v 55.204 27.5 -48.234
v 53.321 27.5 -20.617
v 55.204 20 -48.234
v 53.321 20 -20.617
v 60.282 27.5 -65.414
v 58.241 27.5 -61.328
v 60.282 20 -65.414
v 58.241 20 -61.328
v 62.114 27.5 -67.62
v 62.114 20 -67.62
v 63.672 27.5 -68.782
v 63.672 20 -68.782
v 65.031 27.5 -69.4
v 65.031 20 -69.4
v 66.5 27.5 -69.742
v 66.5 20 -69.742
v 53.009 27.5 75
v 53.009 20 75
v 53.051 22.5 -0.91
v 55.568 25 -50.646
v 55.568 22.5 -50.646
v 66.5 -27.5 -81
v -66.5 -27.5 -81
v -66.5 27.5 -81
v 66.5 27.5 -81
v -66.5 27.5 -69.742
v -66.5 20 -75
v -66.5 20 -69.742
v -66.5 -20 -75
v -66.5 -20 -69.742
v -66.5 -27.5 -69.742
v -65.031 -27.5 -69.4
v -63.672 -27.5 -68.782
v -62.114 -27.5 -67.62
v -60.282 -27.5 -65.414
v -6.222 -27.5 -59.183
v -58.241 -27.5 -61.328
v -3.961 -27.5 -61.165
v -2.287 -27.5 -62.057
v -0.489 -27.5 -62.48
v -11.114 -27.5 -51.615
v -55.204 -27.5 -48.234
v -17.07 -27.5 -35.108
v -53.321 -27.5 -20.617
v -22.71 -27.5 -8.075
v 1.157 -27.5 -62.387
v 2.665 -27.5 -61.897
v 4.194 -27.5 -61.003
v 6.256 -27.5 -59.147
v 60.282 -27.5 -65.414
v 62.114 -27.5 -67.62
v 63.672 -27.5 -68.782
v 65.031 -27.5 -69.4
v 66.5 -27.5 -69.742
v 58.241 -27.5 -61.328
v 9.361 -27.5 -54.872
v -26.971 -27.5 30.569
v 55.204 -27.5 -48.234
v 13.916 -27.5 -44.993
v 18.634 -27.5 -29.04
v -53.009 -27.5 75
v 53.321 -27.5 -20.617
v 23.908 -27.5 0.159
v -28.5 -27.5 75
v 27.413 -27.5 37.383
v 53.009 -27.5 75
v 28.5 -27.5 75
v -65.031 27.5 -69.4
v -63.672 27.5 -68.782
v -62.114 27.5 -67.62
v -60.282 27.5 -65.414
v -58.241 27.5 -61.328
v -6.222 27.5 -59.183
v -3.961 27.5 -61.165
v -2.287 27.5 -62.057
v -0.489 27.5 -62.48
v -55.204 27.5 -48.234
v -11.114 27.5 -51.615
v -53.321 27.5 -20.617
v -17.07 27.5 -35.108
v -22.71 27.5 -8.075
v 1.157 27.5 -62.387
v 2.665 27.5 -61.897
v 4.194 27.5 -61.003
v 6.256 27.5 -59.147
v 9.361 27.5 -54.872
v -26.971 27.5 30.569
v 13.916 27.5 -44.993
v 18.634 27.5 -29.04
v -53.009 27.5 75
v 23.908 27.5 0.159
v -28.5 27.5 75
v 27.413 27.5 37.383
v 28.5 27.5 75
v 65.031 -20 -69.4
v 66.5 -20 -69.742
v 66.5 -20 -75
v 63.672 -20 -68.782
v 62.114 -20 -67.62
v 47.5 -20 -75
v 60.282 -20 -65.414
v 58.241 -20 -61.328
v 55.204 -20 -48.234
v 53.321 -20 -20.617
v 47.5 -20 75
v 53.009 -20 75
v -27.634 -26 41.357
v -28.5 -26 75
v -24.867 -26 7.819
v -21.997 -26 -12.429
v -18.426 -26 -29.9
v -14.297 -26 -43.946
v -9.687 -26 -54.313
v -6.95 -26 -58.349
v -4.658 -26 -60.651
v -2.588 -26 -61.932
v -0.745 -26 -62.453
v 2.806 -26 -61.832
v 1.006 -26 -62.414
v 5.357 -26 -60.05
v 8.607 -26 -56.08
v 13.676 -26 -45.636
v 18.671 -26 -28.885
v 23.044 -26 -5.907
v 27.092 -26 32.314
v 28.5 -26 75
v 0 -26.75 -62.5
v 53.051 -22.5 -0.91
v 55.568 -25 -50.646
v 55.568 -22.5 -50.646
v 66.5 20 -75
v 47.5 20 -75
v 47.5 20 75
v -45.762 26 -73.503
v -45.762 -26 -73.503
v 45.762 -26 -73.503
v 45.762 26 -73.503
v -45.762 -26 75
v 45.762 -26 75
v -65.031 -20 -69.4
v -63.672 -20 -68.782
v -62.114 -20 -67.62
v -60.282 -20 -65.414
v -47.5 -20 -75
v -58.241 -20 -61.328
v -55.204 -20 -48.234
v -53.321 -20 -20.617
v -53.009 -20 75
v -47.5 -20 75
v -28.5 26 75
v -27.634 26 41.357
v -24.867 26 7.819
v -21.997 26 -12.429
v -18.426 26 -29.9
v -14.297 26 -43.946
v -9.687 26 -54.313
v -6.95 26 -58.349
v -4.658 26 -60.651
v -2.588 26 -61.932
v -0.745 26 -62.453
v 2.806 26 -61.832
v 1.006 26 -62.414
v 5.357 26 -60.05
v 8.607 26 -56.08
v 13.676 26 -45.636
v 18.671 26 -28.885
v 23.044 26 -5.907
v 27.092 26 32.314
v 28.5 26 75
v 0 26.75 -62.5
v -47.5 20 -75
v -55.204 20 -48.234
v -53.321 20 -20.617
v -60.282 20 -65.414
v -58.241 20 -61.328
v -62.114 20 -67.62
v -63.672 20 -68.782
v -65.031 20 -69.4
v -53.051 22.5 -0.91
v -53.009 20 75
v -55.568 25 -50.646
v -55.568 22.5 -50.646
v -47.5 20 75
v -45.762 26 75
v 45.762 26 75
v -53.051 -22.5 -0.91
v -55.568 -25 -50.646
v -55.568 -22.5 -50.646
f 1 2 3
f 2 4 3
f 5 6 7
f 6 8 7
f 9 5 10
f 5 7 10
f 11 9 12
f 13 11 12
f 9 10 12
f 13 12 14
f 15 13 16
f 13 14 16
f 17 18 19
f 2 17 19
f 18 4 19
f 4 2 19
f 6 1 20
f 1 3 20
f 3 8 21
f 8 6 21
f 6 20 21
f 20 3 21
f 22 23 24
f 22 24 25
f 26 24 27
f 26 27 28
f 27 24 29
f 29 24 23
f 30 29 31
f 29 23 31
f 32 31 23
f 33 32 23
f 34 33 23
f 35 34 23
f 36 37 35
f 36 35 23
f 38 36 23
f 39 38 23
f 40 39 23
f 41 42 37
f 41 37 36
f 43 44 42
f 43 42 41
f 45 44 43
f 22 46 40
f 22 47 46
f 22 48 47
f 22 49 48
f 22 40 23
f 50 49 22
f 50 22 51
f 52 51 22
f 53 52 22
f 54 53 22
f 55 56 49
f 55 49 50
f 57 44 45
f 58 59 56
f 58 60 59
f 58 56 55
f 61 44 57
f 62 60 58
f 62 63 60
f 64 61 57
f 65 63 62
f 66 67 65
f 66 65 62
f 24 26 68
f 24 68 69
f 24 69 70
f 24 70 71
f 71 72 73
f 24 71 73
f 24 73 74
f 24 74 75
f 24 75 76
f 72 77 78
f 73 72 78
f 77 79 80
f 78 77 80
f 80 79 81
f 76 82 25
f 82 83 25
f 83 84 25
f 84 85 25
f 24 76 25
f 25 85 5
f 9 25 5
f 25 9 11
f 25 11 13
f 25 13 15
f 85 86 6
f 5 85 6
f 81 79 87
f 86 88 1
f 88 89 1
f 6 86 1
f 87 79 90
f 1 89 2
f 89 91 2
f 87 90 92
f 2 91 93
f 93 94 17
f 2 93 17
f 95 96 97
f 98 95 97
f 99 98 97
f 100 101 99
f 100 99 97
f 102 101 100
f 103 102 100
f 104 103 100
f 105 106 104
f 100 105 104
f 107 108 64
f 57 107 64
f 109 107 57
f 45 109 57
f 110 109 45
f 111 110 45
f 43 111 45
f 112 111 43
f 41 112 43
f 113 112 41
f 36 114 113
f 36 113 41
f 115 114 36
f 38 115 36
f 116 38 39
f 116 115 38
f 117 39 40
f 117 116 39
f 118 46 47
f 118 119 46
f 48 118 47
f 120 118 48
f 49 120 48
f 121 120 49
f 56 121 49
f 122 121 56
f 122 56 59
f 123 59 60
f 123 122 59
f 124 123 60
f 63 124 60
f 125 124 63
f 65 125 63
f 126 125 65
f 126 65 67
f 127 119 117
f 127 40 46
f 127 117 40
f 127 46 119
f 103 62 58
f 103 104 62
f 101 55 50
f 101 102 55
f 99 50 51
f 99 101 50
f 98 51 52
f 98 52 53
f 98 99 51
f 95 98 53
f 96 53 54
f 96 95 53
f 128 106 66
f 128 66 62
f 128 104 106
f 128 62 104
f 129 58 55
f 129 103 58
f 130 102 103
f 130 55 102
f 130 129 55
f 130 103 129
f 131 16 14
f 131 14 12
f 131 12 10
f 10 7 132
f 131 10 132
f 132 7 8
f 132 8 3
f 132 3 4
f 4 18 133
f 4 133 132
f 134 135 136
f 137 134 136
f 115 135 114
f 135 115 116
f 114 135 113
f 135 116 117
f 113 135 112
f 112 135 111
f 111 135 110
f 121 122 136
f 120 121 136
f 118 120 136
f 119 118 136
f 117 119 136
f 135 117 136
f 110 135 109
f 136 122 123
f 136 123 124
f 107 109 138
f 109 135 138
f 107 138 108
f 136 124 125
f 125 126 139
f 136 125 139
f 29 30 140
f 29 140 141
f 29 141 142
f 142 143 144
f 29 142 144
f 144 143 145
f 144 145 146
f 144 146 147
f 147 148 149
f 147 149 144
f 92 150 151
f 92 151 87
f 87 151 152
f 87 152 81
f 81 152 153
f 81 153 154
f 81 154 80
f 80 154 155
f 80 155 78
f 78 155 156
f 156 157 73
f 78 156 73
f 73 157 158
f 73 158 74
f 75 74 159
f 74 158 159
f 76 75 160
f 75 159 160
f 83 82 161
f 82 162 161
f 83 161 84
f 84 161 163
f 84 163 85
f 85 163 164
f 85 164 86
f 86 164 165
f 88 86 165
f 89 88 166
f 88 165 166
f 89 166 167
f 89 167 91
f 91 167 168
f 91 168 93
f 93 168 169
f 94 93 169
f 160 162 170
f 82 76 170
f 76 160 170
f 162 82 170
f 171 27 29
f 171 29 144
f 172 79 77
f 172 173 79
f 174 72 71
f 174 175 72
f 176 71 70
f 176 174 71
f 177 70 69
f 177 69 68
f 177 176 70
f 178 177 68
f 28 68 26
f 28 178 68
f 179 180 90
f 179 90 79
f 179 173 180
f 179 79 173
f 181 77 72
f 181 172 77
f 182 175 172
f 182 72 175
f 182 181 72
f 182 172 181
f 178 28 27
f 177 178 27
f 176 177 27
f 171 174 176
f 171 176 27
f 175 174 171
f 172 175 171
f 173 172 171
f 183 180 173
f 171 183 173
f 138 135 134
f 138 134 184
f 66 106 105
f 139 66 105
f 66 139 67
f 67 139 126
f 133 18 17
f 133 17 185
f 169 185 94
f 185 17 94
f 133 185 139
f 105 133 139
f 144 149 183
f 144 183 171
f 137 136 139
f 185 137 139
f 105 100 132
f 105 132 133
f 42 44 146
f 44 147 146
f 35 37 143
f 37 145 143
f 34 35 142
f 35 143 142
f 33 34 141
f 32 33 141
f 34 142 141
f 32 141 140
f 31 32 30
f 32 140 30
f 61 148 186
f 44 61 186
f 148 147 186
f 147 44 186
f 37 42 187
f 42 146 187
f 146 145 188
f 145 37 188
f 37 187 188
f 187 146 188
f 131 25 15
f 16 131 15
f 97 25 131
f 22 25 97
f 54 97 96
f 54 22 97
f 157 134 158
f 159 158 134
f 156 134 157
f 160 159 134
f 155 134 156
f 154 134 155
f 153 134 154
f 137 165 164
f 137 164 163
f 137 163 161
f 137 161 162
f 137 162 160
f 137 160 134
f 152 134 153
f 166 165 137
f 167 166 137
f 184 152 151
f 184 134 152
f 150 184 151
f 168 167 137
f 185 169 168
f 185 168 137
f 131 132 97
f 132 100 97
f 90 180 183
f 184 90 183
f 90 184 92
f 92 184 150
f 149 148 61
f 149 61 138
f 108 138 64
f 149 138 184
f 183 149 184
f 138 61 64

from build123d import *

# Parameters (mm, degrees)
F1_DEPTH = 27.5
F2_W     = 92
F2_H     = 160
F3_DEPTH = 26
F5_START = 20
F5_DEPTH = 7.5
F8_W     = 133
F8_H     = 6
F9_DEPTH = 27.5


# Not quite as in the source:
# - a feature names something its author has since deleted; it is built from what else it names


with BuildPart() as f1:
    # F0 (on Front) → F1 (new body, symmetric)
    with BuildSketch(Plane.XZ):
        with BuildLine():
            Line((-47.5, -75), (47.5, -75))
            Line((47.5, -75), (47.5, 75))
            Line((47.5, 75), (28.5, 75))
            add(Edge.make_bspline(
                [(0, -62.5), (28.5, -62.5), (28.5, 75)],
                knots=[0, 0, 0, 1.5707963268, 1.5707963268, 1.5707963268], degree=2, weights=[1, 0.7071067812, 1]))
            add(Edge.make_bspline(
                [(-28.5, 75), (-28.5, -62.5), (0, -62.5)],
                knots=[4.7123889804, 4.7123889804, 4.7123889804, 6.2831853072, 6.2831853072, 6.2831853072], degree=2, weights=[1, 0.7071067812, 1]))
            Line((-28.5, 75), (-47.5, 75))
            Line((-47.5, 75), (-47.5, -75))
        make_face()
    extrude(amount=F1_DEPTH, both=True)

    # F2 (on Front) → F3 (cut, symmetric)
    with BuildSketch(Plane.XZ):
        with Locations((0.2383571118, 6.4966206347)):
            Rectangle(F2_W, F2_H)
    extrude(amount=F3_DEPTH, both=True, mode=Mode.SUBTRACT)

    # F4 (on Front) → F5 (join)
    with BuildSketch(Plane.XZ.offset(F5_START)):
        with BuildLine():
            add(Edge.make_bspline(
                [(53.0086401116, 75), (53.7921645124, -12.5080782441), (49.3814773033, -67.453669192), (66.5, -69.7422416255)],
                knots=[0, 0, 0, 0, 145.3696436758, 145.3696436758, 145.3696436758, 145.3696436758], degree=3))
            Line((53.0086401116, 75), (47.5, 75))
            Line((47.5, 75), (47.5, -75))
            Line((47.5, -75), (66.5, -75))
            Line((66.5, -75), (66.5, -69.7422416255))
        make_face()
    extrude(amount=F5_DEPTH)

    # F6: F1 across plane


with BuildPart() as f1_1:
    add(f1.part)
    add(f1.part.mirror(Plane.YZ))

    # F7: F1 across plane


with BuildPart() as f1_2:
    add(f1_1.part)
    add(f1_1.part.mirror(Plane.XZ))

    # F8 (on Front) → F9 (join, symmetric)
    with BuildSketch(Plane.XZ):
        with Locations((0, -78)):
            Rectangle(F8_W, F8_H)
    extrude(amount=F9_DEPTH, both=True)


solid = f1_2.part
